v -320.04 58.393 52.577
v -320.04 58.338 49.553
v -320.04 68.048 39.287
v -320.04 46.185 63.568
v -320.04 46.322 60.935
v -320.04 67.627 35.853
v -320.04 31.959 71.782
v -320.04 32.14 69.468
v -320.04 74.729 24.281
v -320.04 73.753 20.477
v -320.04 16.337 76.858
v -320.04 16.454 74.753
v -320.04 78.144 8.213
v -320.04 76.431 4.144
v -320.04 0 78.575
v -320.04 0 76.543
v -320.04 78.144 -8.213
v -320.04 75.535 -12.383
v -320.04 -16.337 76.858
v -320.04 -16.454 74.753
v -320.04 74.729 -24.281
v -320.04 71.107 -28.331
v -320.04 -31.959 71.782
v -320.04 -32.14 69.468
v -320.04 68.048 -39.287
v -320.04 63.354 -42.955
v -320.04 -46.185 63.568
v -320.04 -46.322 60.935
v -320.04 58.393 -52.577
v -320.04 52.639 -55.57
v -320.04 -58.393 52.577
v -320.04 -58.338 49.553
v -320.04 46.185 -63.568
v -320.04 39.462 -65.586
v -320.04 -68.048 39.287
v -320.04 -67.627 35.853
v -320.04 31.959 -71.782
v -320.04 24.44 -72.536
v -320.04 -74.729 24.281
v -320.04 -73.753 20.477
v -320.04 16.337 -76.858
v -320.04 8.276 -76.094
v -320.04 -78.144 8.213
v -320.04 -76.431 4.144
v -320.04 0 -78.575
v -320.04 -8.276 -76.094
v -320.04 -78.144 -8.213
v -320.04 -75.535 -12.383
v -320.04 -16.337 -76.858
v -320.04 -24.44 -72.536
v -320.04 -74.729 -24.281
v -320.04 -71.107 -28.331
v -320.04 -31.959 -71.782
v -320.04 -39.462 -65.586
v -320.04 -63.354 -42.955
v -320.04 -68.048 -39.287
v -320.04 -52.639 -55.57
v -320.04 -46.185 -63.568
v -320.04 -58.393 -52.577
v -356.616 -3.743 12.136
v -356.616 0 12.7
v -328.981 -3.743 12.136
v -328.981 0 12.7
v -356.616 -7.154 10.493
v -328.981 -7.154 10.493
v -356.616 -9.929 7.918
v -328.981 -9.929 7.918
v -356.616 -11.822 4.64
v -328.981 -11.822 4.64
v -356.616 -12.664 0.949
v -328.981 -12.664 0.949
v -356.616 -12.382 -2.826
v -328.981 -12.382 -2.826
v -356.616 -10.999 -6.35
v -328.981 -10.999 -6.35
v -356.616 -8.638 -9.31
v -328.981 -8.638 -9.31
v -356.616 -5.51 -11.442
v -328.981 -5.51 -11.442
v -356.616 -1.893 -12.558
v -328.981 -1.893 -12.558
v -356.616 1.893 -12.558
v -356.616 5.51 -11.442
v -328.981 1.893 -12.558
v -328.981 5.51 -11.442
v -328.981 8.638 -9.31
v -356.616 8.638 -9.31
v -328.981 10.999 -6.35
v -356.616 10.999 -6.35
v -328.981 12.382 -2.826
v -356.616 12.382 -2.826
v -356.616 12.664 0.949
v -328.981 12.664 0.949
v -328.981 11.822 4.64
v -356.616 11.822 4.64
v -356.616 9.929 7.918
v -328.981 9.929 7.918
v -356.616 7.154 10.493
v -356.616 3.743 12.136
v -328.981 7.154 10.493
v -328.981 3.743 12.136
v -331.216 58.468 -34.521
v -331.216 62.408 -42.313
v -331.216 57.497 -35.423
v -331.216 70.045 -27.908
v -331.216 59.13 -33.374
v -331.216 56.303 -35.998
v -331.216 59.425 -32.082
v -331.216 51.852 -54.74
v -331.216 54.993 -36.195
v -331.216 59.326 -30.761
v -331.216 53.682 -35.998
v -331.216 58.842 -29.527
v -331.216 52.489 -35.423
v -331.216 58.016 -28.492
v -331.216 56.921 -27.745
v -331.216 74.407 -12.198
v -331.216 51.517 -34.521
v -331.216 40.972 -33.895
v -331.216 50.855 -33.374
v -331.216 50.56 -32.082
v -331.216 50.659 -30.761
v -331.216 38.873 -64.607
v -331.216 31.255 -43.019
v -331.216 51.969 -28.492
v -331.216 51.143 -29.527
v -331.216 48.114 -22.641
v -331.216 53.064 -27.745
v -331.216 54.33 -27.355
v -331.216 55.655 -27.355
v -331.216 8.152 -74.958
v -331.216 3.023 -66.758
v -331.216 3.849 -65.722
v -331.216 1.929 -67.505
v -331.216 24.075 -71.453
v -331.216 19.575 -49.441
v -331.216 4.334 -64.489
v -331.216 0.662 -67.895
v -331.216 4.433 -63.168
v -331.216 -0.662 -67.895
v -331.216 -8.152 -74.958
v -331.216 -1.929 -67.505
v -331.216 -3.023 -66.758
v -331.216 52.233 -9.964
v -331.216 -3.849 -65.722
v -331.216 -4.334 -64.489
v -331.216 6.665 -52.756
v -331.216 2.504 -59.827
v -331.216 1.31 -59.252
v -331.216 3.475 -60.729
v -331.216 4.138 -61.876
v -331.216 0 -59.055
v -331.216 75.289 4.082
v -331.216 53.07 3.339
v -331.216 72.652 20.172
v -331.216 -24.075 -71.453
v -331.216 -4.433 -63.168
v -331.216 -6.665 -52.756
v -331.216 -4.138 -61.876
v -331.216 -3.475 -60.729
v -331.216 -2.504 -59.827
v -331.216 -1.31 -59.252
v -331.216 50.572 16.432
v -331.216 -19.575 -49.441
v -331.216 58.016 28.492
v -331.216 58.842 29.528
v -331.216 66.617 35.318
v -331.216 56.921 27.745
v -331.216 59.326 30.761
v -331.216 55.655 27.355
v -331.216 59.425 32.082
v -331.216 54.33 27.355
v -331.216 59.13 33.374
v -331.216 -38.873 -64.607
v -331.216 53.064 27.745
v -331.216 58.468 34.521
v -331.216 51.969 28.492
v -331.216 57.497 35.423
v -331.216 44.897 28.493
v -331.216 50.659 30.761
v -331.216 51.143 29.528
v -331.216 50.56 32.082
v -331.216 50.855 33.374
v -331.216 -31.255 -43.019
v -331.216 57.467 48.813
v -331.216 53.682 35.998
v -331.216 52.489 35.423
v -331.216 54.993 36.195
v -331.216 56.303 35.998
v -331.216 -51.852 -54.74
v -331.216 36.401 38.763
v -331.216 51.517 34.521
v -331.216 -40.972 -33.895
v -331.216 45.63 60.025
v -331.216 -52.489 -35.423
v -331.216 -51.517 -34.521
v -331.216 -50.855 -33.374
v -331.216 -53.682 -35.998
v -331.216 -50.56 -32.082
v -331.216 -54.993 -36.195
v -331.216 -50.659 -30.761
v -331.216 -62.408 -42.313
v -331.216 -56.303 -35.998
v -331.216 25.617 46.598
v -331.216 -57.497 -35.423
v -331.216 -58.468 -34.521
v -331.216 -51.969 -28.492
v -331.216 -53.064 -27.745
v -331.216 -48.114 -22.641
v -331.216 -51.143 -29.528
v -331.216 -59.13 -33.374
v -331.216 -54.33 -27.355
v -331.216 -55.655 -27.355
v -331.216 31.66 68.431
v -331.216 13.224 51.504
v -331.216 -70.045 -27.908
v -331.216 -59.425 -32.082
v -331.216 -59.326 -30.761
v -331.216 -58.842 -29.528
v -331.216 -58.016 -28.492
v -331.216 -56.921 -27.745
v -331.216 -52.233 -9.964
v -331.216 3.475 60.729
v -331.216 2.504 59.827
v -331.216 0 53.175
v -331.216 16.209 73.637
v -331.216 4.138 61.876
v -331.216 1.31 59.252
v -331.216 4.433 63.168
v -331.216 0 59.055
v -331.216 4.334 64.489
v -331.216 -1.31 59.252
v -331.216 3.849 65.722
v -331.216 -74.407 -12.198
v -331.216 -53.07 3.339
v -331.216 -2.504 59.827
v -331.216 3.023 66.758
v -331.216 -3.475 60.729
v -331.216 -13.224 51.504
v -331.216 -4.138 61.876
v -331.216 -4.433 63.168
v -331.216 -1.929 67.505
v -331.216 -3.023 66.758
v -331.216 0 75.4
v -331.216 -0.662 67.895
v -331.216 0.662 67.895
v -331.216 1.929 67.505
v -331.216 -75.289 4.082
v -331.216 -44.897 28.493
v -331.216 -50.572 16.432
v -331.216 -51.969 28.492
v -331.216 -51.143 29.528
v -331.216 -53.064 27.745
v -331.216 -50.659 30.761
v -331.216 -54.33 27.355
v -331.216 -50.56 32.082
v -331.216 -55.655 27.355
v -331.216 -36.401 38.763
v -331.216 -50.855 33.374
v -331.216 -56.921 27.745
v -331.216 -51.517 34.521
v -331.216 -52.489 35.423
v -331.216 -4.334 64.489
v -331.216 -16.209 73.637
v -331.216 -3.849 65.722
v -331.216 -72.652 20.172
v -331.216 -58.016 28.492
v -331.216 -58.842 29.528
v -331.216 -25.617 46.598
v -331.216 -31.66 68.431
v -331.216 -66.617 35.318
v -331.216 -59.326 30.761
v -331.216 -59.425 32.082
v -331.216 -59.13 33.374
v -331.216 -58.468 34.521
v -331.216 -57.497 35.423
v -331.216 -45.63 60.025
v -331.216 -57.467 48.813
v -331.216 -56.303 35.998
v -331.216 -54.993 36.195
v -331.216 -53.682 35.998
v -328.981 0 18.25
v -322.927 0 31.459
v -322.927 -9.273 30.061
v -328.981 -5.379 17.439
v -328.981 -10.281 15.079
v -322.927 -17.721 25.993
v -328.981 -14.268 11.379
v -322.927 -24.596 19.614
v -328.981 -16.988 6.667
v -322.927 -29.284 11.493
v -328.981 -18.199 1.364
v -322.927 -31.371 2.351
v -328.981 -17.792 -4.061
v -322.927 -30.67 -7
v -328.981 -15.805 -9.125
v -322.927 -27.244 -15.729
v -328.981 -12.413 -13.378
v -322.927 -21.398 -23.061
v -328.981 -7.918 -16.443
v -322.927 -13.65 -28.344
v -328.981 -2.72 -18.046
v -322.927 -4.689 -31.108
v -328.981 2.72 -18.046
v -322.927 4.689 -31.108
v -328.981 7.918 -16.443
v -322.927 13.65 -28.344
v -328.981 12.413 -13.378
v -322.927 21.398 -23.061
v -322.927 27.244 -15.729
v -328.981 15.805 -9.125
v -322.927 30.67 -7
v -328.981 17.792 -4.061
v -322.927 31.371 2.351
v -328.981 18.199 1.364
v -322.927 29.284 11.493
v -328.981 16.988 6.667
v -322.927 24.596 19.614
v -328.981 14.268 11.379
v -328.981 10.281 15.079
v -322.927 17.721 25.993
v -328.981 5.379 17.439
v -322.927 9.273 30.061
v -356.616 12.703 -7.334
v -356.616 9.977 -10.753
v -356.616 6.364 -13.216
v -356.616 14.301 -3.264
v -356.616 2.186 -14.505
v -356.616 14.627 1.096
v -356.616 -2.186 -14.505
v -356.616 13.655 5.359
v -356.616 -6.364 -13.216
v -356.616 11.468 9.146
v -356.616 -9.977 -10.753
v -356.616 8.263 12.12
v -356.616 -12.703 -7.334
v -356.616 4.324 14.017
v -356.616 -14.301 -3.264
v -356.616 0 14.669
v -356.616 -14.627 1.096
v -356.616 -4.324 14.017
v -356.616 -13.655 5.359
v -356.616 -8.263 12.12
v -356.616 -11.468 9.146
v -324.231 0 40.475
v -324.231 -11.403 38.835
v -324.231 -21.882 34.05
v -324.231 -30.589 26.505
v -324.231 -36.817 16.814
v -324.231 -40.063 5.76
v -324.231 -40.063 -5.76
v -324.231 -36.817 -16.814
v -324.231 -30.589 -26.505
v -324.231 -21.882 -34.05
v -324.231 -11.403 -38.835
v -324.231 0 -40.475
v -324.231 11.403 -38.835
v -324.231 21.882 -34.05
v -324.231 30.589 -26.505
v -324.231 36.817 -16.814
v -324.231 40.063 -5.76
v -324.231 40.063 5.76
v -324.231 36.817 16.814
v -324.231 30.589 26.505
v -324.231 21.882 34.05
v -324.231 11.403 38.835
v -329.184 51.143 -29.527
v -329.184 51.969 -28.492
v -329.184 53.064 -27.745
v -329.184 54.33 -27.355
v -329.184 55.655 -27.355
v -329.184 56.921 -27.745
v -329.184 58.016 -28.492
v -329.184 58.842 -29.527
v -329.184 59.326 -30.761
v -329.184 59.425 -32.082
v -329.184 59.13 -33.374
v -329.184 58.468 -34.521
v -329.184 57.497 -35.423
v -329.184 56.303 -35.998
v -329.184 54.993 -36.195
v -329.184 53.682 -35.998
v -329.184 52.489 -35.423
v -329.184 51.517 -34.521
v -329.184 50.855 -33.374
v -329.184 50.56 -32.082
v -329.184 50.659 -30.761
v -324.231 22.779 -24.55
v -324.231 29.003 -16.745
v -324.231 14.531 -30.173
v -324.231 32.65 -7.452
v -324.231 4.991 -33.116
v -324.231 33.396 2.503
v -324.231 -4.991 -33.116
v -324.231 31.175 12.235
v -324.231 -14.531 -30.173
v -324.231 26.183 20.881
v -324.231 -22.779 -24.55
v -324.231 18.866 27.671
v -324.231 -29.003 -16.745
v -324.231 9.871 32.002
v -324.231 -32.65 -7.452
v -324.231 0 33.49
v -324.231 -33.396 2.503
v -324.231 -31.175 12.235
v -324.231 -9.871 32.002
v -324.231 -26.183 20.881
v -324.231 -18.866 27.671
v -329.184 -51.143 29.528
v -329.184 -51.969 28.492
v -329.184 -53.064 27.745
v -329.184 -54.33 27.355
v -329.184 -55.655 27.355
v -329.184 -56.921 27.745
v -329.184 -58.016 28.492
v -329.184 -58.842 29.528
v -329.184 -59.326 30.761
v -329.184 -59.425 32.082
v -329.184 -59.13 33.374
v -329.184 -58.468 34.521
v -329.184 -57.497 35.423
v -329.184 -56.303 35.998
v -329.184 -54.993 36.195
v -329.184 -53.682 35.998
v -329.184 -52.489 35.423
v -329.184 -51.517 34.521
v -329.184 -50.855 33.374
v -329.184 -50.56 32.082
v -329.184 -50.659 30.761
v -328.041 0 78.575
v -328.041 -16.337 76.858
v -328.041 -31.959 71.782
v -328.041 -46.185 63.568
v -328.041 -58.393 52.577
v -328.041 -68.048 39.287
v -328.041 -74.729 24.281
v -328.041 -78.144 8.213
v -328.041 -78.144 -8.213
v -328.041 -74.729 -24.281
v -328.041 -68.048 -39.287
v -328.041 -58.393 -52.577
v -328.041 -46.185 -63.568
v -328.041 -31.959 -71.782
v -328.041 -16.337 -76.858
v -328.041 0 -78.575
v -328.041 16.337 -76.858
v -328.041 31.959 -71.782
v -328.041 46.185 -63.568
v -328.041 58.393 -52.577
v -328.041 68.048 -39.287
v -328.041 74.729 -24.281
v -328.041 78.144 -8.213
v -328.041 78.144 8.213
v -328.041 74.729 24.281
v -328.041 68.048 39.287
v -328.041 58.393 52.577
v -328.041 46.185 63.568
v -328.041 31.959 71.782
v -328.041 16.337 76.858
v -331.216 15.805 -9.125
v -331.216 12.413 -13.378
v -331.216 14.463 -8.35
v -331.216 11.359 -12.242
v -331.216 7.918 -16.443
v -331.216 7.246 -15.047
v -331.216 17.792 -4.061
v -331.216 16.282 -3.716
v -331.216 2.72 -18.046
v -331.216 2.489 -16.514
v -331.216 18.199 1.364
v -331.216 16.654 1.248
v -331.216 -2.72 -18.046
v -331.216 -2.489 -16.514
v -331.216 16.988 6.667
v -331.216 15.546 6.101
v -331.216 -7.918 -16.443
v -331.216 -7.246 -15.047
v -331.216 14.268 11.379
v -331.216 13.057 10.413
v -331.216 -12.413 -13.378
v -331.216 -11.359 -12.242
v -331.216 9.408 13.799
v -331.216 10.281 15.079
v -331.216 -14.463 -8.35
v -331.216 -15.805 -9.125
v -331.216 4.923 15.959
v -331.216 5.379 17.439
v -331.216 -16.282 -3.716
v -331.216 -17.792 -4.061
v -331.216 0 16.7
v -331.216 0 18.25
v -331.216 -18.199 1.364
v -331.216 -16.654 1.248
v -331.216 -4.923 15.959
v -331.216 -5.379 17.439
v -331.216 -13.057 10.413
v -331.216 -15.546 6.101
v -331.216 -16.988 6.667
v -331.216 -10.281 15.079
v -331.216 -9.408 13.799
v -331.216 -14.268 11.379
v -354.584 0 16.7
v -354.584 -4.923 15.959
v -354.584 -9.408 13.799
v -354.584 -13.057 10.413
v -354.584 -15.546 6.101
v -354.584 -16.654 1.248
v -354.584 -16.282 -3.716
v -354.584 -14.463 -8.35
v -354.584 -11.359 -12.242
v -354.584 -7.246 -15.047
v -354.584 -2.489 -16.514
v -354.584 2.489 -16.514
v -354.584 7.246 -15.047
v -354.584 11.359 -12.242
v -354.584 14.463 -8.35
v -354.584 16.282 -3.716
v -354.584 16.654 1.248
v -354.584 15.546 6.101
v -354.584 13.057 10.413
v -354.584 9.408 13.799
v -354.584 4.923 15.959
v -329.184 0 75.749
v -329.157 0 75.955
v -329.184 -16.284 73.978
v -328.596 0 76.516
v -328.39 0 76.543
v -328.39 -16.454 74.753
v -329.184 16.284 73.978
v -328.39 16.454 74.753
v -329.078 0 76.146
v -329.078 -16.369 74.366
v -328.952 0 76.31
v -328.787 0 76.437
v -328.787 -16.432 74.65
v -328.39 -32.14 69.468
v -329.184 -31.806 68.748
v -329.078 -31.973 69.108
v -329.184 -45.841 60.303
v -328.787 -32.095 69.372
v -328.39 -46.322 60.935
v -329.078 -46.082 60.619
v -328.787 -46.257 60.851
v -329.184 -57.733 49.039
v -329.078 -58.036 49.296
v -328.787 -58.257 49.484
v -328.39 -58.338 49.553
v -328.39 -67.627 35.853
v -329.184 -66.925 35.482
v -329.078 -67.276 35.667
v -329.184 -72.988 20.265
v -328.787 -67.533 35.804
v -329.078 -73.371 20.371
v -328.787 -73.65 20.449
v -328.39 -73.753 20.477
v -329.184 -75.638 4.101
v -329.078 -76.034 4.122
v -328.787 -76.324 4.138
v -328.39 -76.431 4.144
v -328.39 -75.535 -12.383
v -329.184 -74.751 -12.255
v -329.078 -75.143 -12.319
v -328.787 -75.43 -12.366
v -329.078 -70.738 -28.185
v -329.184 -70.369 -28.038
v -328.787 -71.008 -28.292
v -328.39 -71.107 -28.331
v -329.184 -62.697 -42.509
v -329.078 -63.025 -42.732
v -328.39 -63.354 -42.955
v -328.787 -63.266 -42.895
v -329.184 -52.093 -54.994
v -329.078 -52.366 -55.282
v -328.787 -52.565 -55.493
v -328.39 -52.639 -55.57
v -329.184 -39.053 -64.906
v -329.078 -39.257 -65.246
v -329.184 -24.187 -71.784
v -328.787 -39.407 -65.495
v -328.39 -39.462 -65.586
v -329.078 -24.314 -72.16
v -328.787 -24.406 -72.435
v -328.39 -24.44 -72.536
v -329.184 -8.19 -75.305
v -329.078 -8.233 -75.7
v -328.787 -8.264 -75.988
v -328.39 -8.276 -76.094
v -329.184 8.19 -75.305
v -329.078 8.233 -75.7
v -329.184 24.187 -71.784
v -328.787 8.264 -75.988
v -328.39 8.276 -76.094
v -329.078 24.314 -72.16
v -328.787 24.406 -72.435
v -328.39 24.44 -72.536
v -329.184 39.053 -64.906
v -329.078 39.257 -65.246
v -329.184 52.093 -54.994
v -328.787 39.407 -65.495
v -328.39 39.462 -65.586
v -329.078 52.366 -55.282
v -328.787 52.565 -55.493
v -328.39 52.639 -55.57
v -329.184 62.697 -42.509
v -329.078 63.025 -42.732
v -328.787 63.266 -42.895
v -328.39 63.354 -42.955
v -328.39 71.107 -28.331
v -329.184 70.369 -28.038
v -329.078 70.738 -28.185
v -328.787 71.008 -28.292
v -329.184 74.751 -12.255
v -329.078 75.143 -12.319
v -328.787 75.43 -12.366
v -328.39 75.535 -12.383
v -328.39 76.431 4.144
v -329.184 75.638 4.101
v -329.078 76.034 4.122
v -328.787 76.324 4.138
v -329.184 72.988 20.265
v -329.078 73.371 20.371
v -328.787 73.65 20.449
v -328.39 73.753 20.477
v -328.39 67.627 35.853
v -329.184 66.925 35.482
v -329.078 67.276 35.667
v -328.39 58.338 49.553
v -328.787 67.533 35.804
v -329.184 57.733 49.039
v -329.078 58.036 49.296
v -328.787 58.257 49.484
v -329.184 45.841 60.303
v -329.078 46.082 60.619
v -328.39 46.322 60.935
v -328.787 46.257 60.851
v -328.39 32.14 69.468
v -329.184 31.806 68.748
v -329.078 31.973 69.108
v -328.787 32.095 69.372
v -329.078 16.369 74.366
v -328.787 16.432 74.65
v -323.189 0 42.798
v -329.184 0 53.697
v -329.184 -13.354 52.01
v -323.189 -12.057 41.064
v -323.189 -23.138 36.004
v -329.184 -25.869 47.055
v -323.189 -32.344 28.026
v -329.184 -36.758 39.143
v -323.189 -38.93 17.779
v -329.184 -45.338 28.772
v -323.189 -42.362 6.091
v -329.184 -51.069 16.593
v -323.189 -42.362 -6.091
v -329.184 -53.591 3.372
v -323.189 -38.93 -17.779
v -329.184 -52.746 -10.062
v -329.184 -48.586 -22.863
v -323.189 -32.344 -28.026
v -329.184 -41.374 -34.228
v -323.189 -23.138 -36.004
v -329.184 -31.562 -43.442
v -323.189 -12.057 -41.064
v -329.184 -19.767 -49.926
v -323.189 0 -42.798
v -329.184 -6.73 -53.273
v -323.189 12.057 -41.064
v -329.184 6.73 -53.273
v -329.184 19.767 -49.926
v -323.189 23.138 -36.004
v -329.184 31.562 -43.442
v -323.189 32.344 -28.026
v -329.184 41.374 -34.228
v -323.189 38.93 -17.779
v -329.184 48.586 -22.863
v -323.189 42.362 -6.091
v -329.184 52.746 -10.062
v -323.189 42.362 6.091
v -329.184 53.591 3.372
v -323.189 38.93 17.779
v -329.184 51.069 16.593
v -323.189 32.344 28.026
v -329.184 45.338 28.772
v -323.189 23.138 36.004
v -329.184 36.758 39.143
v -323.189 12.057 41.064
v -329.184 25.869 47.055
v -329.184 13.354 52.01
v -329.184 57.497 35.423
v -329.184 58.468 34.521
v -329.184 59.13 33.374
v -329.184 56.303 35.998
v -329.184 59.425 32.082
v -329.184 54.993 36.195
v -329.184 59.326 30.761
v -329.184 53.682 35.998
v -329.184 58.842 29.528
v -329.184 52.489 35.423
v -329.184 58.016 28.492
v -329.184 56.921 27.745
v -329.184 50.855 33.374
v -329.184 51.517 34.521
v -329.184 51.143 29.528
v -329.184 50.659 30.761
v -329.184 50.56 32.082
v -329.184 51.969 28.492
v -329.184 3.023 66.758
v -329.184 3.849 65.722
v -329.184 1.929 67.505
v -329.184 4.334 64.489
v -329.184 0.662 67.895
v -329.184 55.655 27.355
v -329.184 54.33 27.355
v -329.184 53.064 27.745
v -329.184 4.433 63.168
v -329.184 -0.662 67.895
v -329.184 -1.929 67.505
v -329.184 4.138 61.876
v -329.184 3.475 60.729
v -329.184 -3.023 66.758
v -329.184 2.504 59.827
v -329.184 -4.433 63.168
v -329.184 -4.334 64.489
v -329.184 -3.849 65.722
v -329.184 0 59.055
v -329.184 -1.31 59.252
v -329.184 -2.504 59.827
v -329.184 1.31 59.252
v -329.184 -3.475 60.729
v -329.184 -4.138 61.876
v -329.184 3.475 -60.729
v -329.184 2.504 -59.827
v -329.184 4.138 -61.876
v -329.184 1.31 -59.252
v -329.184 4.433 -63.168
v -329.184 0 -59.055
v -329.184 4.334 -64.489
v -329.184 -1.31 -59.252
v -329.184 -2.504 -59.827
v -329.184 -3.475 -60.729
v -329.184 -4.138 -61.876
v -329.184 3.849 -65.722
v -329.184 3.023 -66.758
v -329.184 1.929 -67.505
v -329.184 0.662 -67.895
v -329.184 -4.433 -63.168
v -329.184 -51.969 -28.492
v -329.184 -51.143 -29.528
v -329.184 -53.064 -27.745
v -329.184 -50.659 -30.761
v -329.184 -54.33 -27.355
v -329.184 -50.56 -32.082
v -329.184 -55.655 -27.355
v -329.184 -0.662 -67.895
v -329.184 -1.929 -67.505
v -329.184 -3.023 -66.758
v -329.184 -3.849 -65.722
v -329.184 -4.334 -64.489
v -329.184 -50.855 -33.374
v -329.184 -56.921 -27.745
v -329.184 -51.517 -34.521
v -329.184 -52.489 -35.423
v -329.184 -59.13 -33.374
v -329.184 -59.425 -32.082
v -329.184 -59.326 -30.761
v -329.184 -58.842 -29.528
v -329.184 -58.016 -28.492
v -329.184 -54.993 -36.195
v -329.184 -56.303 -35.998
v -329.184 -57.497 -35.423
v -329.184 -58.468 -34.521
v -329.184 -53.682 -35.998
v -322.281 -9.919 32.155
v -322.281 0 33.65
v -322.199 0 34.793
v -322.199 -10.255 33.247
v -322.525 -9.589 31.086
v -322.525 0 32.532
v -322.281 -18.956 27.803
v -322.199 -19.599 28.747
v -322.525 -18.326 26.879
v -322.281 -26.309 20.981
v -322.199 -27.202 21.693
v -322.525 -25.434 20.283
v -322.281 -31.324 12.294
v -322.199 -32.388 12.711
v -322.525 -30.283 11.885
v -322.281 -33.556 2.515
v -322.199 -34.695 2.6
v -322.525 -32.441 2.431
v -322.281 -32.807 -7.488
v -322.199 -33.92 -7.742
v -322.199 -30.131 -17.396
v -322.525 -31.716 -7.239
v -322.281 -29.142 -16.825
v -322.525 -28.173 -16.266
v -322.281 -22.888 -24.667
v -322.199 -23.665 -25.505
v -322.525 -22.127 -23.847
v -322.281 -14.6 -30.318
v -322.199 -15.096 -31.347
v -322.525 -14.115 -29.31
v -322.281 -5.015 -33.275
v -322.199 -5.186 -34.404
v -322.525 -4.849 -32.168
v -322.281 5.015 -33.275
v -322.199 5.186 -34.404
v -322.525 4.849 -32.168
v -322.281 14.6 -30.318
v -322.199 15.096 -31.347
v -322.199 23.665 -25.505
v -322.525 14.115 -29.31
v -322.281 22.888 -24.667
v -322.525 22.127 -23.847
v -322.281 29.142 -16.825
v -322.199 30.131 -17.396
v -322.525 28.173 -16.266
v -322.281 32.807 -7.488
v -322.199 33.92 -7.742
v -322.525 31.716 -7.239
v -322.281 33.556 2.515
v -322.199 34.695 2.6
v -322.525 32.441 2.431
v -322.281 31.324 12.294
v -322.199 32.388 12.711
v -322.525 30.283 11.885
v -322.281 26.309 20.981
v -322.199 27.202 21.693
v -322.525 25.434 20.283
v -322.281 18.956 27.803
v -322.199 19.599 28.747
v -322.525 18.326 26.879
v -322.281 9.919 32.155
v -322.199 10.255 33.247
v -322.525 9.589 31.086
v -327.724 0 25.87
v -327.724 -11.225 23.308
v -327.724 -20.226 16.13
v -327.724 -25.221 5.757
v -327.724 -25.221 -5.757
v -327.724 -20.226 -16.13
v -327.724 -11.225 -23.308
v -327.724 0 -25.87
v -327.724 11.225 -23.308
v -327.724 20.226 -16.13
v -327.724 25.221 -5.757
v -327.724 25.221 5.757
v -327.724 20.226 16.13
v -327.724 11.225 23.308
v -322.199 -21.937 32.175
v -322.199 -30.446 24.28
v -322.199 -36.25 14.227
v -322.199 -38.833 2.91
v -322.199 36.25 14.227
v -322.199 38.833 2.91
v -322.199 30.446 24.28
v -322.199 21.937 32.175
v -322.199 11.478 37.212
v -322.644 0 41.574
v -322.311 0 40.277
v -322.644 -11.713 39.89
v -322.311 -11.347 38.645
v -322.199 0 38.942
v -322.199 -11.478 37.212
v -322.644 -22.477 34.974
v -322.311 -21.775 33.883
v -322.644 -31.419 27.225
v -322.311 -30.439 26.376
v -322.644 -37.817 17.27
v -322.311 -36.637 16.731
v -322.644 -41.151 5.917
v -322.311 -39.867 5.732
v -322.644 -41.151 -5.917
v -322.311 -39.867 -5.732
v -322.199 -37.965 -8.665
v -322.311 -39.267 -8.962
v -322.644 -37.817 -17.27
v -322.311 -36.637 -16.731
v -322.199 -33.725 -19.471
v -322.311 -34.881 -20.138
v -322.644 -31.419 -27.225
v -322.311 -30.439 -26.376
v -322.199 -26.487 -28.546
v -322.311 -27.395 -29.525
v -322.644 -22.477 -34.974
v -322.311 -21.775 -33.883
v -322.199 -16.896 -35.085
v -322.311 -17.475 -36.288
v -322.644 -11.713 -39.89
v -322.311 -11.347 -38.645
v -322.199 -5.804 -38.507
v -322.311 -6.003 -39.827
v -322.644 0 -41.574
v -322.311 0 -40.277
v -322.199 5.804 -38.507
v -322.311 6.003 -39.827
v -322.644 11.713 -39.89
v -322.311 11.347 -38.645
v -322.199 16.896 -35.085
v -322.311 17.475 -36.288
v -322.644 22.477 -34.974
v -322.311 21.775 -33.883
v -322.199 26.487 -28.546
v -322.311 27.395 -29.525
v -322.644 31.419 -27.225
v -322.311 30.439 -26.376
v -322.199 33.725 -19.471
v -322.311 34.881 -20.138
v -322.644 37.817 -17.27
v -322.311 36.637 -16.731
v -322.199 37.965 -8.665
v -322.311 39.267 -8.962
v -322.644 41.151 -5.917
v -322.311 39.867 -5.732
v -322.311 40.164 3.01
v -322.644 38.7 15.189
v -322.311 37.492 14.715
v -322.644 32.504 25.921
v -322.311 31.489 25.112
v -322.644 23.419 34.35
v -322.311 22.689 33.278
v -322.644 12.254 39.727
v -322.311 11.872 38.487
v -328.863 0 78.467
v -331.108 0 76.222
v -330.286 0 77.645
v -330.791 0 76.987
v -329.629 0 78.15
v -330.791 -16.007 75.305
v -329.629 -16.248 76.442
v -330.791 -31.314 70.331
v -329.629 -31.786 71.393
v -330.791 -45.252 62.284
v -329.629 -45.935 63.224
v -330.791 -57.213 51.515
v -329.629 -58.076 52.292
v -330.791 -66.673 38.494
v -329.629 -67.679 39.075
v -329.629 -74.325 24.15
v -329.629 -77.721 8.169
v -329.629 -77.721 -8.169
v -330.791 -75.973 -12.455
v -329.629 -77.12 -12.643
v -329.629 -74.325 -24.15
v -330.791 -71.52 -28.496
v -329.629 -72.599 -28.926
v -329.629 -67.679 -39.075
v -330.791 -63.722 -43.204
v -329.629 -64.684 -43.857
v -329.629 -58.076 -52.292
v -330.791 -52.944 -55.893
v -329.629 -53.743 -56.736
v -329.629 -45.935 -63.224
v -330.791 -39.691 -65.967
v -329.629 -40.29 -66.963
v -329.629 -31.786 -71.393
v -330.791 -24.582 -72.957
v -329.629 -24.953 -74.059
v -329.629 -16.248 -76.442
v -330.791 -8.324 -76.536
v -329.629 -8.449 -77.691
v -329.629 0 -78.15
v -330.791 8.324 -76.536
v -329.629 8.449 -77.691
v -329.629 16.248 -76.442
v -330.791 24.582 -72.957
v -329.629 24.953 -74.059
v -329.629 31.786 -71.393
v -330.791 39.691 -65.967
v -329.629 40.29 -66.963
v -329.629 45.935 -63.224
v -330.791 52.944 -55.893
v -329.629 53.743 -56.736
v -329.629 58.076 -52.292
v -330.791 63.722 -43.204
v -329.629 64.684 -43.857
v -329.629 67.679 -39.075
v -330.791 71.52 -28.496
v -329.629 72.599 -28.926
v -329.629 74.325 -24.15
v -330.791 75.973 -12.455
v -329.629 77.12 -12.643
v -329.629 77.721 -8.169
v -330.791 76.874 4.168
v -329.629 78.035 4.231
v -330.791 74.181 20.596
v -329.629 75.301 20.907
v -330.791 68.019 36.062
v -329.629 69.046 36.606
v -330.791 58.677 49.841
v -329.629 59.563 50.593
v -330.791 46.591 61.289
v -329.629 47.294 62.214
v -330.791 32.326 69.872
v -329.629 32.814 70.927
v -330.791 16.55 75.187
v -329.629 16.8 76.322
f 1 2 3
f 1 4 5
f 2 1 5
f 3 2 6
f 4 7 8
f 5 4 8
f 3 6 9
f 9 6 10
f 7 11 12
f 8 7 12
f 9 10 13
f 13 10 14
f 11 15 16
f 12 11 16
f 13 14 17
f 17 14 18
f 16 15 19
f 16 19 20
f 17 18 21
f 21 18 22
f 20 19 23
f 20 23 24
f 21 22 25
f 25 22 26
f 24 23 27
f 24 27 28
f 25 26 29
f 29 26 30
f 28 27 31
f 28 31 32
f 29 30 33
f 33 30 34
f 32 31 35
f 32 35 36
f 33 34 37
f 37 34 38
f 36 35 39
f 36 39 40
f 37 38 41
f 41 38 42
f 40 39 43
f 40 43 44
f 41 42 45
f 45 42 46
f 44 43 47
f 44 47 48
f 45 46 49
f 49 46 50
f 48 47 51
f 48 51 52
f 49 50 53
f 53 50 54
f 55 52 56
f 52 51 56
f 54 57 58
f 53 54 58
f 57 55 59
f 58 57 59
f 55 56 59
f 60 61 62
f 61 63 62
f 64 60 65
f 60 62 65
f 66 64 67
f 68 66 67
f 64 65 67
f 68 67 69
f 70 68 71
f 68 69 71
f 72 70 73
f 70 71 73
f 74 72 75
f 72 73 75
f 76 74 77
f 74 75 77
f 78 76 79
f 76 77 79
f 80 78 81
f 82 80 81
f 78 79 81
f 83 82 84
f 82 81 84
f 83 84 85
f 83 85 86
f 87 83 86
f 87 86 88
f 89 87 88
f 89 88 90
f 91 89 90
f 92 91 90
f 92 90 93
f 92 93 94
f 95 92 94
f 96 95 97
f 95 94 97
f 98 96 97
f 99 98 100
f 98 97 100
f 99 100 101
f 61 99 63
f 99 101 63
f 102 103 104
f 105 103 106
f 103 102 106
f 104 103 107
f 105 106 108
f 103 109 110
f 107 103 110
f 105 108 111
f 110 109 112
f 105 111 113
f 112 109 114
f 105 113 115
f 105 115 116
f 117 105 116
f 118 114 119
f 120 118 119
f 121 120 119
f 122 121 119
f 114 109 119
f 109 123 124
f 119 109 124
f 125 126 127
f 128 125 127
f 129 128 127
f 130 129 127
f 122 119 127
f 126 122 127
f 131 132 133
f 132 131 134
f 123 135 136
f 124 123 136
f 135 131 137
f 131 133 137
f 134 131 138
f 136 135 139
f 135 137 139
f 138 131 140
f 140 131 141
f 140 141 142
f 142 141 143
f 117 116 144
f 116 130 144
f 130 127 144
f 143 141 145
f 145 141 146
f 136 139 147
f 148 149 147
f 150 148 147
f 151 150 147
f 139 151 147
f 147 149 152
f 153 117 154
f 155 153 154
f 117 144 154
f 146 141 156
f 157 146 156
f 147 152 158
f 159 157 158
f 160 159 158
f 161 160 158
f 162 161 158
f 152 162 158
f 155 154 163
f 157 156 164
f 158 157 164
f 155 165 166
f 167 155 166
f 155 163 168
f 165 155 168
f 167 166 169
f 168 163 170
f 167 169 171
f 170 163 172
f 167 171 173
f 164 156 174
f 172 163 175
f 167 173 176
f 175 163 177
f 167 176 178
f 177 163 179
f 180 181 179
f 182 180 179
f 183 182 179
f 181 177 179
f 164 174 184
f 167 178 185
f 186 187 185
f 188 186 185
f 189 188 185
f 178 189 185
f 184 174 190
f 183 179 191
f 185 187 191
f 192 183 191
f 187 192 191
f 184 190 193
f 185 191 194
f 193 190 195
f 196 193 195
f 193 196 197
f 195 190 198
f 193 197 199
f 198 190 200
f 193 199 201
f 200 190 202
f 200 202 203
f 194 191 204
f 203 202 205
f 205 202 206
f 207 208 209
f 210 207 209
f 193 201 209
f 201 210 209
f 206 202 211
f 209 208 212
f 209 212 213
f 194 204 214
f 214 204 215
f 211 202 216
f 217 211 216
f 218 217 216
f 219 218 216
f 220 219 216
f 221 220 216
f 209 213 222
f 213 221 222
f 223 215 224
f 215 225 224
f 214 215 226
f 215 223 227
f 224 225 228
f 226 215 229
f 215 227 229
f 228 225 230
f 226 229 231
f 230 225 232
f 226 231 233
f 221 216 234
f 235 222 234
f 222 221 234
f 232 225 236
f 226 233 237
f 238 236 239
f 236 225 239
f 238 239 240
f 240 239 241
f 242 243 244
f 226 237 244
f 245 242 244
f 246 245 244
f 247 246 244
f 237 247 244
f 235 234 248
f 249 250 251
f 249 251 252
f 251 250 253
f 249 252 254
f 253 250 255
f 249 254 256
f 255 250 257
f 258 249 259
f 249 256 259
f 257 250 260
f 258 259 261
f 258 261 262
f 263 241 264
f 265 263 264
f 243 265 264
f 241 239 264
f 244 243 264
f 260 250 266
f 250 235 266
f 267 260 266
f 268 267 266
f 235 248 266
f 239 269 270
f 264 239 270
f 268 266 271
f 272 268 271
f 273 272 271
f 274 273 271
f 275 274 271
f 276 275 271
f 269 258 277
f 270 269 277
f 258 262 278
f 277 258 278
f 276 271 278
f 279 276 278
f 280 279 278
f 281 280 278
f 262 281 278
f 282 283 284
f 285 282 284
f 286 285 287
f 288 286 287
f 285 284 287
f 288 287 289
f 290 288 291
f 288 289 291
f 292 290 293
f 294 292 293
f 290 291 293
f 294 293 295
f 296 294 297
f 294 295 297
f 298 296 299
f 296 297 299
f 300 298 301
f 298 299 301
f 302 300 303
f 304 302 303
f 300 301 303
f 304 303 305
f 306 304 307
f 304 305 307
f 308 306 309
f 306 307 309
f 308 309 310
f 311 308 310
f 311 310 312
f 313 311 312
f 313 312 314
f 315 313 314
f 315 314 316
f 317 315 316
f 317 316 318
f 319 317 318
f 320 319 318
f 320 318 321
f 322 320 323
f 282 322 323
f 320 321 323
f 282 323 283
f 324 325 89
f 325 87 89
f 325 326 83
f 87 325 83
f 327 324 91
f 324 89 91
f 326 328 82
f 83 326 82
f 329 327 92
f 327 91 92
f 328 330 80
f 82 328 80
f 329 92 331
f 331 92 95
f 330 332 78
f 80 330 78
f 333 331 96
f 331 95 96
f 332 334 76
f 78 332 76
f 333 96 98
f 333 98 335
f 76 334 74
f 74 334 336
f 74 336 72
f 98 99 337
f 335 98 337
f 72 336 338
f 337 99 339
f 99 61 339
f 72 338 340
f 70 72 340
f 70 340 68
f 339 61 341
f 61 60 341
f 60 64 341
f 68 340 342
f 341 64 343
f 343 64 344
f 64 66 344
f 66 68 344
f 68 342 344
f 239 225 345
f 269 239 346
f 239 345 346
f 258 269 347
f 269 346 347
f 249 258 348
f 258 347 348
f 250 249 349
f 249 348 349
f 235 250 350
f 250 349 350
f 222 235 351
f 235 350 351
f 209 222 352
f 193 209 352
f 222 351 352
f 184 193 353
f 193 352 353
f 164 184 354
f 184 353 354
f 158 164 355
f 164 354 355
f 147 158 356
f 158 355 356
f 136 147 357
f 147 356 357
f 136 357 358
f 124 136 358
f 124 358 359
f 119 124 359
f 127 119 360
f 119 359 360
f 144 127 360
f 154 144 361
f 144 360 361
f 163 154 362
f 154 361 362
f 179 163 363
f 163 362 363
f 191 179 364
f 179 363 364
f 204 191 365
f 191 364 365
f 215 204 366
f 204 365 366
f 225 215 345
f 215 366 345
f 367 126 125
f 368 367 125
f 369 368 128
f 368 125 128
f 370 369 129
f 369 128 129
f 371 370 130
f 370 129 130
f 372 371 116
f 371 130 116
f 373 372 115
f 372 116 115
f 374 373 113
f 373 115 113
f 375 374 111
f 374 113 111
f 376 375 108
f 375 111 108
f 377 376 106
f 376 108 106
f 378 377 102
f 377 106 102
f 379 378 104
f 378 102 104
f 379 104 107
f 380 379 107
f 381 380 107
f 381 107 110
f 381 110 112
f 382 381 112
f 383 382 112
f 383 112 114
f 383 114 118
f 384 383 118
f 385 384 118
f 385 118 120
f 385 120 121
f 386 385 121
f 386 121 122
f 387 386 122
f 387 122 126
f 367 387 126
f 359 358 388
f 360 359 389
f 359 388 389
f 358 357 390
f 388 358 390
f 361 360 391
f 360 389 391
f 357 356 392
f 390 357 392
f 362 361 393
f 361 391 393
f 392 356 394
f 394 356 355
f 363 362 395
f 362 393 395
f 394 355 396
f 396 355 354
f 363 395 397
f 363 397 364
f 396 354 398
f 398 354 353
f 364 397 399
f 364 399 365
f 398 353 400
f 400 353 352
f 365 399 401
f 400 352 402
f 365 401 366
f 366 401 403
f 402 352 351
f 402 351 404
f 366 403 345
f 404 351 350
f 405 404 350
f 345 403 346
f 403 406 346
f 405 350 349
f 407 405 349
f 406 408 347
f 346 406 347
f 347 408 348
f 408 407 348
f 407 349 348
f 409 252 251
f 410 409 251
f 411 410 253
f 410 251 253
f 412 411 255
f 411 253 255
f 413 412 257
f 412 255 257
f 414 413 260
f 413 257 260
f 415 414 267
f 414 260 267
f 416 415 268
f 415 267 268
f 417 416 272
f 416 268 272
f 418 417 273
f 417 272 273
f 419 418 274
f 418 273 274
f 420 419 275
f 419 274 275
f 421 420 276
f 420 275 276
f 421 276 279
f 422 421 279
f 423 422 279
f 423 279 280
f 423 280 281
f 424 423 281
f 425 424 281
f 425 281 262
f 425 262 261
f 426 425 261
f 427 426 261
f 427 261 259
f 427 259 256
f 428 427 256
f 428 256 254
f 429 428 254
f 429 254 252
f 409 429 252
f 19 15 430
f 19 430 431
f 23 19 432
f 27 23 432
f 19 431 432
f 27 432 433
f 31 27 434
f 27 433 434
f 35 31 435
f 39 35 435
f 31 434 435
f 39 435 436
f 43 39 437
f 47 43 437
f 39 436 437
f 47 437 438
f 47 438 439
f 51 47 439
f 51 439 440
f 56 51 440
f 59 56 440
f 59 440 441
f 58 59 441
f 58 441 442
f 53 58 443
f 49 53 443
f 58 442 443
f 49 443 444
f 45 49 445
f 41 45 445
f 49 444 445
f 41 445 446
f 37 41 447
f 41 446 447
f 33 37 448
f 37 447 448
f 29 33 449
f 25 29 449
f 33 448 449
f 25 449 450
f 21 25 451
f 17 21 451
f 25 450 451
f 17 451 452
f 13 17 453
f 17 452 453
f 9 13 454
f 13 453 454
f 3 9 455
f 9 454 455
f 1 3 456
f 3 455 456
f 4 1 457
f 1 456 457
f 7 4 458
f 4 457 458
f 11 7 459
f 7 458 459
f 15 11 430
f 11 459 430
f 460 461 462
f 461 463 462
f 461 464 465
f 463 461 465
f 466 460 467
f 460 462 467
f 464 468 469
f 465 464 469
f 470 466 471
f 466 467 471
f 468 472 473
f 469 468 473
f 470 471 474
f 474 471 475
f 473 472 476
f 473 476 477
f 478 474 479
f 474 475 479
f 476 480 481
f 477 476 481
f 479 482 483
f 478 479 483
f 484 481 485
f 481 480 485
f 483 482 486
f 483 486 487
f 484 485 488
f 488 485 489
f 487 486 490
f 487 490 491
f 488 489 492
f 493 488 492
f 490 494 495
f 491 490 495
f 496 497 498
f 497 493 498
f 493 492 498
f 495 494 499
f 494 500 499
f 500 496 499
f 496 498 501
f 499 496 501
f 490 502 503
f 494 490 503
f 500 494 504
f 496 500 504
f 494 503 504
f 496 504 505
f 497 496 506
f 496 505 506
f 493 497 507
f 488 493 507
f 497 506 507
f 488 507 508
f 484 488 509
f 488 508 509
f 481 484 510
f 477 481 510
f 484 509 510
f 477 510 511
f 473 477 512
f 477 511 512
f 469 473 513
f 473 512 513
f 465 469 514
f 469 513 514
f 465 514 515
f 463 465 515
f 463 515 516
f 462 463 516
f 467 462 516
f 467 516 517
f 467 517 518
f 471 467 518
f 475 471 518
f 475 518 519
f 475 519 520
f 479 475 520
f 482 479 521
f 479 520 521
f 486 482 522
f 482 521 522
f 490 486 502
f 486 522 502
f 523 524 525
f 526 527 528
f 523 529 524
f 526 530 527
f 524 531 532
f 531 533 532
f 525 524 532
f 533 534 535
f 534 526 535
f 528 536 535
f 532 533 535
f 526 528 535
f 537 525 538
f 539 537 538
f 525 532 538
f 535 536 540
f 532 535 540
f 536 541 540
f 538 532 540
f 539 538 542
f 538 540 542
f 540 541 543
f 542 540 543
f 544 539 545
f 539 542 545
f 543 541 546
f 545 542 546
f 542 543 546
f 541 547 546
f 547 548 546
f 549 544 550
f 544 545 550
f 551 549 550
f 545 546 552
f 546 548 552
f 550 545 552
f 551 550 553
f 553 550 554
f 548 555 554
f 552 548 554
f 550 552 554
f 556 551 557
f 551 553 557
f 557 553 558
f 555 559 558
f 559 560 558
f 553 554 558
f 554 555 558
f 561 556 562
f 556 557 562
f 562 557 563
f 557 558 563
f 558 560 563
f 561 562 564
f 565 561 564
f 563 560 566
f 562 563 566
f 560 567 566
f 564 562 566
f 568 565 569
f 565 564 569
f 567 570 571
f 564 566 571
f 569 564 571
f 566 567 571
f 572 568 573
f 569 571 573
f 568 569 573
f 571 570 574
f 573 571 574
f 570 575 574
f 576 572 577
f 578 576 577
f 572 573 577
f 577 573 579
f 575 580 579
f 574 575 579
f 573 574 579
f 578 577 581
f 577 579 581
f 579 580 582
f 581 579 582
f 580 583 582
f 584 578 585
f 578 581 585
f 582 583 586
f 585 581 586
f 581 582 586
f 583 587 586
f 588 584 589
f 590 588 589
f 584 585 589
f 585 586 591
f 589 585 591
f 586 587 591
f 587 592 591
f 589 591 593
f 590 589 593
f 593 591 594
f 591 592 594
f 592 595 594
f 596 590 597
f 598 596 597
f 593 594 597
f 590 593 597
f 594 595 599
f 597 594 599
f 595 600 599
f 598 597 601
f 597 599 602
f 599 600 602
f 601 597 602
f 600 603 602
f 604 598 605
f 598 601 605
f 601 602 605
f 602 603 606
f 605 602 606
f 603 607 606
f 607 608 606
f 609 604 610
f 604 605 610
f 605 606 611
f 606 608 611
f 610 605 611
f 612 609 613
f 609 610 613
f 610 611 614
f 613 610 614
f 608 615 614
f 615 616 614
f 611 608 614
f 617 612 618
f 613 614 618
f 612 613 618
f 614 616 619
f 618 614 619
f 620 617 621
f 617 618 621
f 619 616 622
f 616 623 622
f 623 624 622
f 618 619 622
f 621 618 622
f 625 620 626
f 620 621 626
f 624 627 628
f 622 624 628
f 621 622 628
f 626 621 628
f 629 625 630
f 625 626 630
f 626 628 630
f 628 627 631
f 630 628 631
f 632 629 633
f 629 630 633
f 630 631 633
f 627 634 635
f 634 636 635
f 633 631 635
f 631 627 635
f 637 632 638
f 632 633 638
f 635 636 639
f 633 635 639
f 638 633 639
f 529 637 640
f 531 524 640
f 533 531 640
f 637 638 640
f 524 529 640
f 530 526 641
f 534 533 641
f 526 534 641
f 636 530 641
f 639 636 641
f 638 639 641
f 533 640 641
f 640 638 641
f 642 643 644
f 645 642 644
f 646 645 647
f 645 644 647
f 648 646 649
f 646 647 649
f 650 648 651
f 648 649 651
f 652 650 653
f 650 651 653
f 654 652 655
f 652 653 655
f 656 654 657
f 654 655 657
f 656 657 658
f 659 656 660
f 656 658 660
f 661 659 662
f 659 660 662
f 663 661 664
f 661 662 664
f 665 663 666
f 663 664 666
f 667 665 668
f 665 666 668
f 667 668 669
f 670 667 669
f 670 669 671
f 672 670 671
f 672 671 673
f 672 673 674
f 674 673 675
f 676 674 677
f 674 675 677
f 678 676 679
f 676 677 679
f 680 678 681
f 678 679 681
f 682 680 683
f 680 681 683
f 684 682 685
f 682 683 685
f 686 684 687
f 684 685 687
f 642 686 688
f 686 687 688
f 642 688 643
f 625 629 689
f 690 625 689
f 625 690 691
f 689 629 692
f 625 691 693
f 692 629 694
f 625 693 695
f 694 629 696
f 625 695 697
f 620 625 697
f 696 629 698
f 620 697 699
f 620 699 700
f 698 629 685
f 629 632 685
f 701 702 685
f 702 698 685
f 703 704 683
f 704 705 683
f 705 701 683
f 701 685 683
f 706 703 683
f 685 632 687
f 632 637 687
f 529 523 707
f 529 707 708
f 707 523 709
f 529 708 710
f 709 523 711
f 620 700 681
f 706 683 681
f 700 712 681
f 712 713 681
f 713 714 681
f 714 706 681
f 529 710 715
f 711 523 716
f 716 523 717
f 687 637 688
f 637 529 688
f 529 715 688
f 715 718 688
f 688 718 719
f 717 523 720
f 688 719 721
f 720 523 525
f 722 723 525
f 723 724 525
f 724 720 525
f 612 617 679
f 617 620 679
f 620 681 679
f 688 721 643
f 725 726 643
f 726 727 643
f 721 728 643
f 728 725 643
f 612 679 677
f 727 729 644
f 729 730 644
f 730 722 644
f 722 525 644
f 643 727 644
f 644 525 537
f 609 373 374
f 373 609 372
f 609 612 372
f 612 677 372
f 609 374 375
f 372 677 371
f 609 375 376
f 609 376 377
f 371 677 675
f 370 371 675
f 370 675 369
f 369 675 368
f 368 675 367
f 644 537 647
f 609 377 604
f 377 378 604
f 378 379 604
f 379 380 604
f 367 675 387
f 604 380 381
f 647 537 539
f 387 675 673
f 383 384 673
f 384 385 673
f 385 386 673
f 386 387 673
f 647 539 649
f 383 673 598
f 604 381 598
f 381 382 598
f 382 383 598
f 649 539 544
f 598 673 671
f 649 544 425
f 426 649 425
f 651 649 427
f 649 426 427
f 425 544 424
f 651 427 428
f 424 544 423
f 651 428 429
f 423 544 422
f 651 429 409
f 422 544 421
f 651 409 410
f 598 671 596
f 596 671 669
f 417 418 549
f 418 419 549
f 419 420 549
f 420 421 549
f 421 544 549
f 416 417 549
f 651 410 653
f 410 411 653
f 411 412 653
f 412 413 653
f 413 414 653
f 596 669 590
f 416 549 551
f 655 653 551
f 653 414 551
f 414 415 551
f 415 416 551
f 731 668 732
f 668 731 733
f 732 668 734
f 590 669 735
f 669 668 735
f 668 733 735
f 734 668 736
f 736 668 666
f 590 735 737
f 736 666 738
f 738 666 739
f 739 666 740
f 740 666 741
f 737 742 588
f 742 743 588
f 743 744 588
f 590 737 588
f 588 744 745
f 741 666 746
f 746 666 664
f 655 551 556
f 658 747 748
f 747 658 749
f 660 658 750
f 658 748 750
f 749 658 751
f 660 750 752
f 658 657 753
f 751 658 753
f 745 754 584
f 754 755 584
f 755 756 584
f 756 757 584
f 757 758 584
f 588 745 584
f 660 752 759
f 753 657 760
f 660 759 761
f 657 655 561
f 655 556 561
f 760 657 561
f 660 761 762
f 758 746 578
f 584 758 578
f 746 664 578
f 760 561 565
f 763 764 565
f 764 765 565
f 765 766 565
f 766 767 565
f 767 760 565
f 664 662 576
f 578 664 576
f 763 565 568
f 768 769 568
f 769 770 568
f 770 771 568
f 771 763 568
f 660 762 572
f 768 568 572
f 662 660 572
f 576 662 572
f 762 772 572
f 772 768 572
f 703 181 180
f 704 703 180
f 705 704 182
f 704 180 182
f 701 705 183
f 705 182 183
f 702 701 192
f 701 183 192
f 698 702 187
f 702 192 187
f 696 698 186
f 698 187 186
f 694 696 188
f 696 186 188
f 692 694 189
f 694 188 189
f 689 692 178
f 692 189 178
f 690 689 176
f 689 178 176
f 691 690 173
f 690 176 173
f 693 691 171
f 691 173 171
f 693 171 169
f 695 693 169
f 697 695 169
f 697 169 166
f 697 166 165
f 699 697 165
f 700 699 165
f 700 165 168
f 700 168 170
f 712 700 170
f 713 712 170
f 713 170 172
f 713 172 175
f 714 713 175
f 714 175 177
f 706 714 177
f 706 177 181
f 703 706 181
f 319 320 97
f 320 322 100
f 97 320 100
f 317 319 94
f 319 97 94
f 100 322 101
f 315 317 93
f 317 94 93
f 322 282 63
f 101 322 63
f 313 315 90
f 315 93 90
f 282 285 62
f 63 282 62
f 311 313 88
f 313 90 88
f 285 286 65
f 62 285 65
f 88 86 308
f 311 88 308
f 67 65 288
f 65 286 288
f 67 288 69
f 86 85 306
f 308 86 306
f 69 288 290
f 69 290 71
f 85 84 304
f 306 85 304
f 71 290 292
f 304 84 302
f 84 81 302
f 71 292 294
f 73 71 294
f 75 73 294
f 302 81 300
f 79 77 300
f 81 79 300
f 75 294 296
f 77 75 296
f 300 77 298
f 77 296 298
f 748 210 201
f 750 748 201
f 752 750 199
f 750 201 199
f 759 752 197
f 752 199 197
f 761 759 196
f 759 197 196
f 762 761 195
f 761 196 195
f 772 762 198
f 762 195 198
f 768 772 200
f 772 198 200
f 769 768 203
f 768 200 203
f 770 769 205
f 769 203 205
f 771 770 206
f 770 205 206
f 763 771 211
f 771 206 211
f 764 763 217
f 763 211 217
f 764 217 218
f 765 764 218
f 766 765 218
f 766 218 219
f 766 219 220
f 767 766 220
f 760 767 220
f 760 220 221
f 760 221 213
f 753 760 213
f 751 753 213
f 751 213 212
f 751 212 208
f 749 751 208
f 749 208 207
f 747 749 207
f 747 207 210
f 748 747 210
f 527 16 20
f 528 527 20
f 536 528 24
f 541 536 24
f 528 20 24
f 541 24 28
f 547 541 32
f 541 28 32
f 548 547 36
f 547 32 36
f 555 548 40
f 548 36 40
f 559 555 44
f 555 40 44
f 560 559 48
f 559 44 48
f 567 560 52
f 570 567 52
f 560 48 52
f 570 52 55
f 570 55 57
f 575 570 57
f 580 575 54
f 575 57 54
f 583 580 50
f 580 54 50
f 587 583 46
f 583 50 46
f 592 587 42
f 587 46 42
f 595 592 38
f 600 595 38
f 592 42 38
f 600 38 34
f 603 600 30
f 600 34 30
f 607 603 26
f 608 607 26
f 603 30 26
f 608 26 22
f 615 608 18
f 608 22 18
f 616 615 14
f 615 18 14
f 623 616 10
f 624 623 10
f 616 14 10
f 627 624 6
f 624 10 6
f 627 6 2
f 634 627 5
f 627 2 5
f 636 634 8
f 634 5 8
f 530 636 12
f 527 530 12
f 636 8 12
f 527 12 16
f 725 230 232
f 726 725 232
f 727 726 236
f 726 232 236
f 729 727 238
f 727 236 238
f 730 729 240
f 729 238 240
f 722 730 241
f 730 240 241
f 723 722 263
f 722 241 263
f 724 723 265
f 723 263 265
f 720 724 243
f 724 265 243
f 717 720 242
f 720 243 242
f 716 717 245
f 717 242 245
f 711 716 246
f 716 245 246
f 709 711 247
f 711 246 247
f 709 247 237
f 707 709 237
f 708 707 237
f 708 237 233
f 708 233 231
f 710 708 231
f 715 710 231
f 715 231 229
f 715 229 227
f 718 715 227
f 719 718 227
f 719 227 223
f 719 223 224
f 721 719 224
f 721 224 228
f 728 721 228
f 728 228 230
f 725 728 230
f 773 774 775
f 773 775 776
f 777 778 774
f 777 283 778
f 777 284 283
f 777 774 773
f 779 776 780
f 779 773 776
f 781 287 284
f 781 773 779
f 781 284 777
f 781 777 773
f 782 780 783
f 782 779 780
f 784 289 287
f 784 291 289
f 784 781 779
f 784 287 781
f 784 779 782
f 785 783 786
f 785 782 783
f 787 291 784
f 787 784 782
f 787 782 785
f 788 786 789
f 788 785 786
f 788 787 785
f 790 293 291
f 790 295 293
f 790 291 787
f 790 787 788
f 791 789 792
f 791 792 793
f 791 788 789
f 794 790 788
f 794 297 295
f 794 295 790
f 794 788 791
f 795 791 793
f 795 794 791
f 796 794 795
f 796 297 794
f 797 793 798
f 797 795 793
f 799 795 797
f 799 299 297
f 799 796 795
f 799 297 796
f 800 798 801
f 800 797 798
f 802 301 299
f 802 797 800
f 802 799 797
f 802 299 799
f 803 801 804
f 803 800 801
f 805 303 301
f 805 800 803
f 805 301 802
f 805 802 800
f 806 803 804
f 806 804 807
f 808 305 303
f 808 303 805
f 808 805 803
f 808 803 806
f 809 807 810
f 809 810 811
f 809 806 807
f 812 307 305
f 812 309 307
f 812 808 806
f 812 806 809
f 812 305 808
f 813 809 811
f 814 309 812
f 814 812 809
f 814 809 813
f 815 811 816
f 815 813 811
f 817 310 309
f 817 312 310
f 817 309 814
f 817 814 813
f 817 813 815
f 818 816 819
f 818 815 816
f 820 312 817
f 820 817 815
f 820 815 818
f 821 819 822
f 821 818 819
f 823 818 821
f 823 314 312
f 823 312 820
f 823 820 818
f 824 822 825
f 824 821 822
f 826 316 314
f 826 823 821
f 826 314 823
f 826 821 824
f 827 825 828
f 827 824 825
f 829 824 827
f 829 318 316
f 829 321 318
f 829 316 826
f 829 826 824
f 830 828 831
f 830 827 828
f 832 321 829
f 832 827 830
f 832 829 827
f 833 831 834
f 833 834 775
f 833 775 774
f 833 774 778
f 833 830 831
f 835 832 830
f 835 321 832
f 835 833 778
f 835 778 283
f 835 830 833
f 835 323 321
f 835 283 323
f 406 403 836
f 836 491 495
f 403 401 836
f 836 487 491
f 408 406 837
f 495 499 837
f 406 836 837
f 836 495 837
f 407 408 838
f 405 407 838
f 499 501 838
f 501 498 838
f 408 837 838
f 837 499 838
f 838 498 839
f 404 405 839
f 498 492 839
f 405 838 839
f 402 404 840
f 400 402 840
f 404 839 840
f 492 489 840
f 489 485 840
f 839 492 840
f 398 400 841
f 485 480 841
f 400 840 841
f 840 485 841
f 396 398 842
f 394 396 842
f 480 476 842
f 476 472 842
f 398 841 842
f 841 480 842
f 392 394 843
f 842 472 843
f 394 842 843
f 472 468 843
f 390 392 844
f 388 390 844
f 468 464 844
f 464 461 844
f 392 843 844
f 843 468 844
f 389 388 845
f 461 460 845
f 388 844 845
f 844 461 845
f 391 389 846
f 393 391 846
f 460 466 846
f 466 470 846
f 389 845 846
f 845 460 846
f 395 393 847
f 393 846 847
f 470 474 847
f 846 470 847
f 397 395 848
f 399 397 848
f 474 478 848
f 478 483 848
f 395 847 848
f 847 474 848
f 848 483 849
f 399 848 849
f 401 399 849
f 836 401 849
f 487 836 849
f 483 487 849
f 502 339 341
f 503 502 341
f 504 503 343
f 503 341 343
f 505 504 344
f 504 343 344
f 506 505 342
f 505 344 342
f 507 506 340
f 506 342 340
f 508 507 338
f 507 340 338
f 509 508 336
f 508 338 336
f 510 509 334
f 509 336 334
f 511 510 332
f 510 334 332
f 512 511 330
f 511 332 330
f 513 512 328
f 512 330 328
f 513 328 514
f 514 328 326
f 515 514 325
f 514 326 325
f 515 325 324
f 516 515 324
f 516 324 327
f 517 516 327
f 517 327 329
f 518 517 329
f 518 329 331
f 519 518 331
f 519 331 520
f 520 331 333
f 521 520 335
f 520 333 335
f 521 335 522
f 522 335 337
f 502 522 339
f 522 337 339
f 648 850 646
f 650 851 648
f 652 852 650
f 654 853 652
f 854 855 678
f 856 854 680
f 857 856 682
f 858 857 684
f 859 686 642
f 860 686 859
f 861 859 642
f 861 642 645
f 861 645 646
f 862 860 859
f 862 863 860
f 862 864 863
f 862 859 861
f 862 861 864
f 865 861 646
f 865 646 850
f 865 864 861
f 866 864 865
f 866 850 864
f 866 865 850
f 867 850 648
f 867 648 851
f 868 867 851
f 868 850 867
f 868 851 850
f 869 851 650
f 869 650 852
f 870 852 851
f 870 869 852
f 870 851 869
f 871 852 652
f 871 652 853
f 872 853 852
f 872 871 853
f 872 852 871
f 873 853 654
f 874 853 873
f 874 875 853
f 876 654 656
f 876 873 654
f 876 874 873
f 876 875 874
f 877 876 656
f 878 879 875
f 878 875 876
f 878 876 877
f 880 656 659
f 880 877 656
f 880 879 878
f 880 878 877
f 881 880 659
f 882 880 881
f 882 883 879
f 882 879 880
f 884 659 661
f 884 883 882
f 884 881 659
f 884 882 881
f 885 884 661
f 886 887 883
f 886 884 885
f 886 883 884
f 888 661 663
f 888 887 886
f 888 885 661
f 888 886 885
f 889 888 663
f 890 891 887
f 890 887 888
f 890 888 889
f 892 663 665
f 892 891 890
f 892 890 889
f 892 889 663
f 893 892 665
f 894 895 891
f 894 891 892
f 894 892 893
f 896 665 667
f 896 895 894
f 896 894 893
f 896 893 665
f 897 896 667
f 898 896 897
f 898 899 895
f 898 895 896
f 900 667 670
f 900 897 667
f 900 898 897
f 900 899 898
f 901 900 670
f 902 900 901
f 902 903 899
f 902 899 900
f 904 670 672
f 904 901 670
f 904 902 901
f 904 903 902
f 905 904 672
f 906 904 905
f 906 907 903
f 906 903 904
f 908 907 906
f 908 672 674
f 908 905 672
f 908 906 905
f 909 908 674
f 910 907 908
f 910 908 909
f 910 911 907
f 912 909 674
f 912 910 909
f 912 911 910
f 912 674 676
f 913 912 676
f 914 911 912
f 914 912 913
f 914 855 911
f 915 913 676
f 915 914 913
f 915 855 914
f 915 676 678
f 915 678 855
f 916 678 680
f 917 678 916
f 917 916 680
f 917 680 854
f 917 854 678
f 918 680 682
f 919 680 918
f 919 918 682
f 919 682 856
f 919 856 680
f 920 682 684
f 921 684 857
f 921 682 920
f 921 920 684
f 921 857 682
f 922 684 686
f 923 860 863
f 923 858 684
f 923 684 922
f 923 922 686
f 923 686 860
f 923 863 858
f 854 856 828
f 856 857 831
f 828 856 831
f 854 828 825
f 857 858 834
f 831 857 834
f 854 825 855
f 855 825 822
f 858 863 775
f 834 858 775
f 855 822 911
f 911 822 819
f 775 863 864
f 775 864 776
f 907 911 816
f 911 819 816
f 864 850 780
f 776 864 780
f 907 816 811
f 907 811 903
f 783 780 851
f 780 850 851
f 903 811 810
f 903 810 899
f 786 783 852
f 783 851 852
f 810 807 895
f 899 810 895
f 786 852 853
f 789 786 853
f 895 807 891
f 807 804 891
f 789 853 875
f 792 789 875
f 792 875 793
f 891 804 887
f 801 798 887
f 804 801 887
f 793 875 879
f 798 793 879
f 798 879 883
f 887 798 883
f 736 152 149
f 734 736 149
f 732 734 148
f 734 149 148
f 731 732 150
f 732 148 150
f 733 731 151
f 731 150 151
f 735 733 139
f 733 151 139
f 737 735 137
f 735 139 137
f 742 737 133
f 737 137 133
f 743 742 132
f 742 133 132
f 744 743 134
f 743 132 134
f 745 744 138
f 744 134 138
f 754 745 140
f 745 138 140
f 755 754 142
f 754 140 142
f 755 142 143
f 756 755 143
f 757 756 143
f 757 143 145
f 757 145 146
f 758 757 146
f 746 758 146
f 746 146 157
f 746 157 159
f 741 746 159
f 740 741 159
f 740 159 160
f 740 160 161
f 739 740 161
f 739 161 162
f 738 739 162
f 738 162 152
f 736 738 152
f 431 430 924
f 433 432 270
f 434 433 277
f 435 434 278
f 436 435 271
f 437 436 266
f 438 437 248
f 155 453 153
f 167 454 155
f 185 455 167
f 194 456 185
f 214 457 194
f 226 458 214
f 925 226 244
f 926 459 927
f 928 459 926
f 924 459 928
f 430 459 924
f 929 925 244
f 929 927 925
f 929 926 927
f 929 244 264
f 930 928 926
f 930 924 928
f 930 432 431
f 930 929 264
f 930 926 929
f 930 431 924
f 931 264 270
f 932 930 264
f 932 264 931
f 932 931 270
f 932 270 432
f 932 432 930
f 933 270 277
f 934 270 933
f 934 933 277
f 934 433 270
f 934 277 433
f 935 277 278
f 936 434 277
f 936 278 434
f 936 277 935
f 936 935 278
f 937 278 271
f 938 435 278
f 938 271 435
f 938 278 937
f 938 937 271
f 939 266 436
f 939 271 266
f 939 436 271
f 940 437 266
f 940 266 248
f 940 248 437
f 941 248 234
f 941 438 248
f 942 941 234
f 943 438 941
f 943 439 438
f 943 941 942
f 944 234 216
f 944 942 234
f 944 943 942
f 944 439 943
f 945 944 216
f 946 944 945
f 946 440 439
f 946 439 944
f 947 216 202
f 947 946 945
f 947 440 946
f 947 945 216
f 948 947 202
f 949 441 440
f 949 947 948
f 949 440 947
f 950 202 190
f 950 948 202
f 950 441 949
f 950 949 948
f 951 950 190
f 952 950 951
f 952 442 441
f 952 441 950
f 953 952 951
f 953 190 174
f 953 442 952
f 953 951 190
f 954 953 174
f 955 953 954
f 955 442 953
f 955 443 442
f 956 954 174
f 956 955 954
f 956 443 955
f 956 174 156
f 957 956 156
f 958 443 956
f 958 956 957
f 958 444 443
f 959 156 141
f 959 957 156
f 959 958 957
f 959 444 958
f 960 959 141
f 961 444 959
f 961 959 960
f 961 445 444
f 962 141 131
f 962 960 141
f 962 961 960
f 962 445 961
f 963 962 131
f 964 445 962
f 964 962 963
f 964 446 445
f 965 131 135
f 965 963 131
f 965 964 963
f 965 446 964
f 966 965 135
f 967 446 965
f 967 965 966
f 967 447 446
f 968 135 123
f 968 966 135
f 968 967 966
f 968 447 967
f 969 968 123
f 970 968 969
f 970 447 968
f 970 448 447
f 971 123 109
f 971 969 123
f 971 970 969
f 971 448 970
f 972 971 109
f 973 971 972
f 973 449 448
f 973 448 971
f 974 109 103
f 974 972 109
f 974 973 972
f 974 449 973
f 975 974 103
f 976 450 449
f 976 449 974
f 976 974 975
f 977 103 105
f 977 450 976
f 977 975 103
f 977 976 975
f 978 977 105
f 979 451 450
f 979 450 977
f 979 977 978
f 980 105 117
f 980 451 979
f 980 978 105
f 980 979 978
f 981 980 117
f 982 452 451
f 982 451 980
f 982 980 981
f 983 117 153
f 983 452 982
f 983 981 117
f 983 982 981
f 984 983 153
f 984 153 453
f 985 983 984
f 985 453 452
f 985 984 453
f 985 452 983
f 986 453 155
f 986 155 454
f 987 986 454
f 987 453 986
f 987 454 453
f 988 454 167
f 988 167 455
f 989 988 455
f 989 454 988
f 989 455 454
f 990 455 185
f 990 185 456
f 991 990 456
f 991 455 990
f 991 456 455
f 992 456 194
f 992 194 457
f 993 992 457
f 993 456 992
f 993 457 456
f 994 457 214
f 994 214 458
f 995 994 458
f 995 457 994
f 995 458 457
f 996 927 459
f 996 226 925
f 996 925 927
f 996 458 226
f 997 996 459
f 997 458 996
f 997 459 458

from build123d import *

# Parameters (mm, degrees)
SKETCH036_R           = 4.445
POCKET003_DEPTH       = 461.643083323
POLARPATTERN003_COUNT = 6
CHAMFER_SIZE          = 2.032
FILLET_R              = 3.175
FILLET001_R           = 0.79375
FILLET002_R           = 8.001


with BuildPart() as part:
    # Sketch035 → Revolution006 (revolve)
    with BuildSketch(Plane.XZ):
        Polygon((0, 78.5749), (-11.176, 78.5749), (-11.176, 53.1749), (-4.191, 40.4749), (-4.191, 33.4899), (-11.176, 18.2499), (-11.176, 16.7005), (-36.576, 16.7005), (-36.576, 12.7), (-8.9407358595, 12.7), (-8.9407358595, 18.2499), (-2.159, 33.0464146026), (-2.159, 40.9968329476), (-9.144, 53.6968329476), (-9.144, 76.5429), (0, 76.5429), align=None)
    revolve(axis=Axis((0, 0, 0), (1, 0, 0)))

    # Sketch036 → Pocket003 (cut, through all)
    with BuildSketch(Plane(origin=(-11.176, 0, 0), x_dir=(0, 0, -1), z_dir=(-1, 0, 0))):
        with Locations((-63.5, 0)):
            Circle(SKETCH036_R)
    pocket003 = extrude(amount=-POCKET003_DEPTH, mode=Mode.SUBTRACT)

    # PolarPattern003: Pocket003 ×6 about axis
    polarpattern003_axis = Axis((-11.176, 0, 0), (-1, 0, 0))
    for i in range(1, POLARPATTERN003_COUNT):
        add(pocket003.rotate(polarpattern003_axis, i * 360 / POLARPATTERN003_COUNT), mode=Mode.SUBTRACT)

    # Chamfer
    chamfer_edges = [part.edges().sort_by_distance(p)[0] for p in [
        (-36.576, 0, -16.7005),
    ]]
    chamfer(chamfer_edges, length=CHAMFER_SIZE)

    # Fillet
    fillet_edges = [part.edges().sort_by_distance(p)[0] for p in [
        (-11.176, 0, -78.5749),
    ]]
    fillet(fillet_edges, radius=FILLET_R)

    # Fillet001
    fillet001_edges = [part.edges().sort_by_distance(p)[0] for p in [
        (-9.144, 0, -76.5429),
    ]]
    fillet(fillet001_edges, radius=FILLET001_R)

    # Fillet002
    fillet002_edges = [part.edges().sort_by_distance(p)[0] for p in [
        (-2.159, 0, -33.046415),
        (-2.159, 0, -40.996833),
    ]]
    fillet(fillet002_edges, radius=FILLET002_R)


with BuildPart() as part_1:
    # Body011 placement: moved
    add(part.part.moved(Location((-320.04, 0, 0))))


solid = part_1.part
